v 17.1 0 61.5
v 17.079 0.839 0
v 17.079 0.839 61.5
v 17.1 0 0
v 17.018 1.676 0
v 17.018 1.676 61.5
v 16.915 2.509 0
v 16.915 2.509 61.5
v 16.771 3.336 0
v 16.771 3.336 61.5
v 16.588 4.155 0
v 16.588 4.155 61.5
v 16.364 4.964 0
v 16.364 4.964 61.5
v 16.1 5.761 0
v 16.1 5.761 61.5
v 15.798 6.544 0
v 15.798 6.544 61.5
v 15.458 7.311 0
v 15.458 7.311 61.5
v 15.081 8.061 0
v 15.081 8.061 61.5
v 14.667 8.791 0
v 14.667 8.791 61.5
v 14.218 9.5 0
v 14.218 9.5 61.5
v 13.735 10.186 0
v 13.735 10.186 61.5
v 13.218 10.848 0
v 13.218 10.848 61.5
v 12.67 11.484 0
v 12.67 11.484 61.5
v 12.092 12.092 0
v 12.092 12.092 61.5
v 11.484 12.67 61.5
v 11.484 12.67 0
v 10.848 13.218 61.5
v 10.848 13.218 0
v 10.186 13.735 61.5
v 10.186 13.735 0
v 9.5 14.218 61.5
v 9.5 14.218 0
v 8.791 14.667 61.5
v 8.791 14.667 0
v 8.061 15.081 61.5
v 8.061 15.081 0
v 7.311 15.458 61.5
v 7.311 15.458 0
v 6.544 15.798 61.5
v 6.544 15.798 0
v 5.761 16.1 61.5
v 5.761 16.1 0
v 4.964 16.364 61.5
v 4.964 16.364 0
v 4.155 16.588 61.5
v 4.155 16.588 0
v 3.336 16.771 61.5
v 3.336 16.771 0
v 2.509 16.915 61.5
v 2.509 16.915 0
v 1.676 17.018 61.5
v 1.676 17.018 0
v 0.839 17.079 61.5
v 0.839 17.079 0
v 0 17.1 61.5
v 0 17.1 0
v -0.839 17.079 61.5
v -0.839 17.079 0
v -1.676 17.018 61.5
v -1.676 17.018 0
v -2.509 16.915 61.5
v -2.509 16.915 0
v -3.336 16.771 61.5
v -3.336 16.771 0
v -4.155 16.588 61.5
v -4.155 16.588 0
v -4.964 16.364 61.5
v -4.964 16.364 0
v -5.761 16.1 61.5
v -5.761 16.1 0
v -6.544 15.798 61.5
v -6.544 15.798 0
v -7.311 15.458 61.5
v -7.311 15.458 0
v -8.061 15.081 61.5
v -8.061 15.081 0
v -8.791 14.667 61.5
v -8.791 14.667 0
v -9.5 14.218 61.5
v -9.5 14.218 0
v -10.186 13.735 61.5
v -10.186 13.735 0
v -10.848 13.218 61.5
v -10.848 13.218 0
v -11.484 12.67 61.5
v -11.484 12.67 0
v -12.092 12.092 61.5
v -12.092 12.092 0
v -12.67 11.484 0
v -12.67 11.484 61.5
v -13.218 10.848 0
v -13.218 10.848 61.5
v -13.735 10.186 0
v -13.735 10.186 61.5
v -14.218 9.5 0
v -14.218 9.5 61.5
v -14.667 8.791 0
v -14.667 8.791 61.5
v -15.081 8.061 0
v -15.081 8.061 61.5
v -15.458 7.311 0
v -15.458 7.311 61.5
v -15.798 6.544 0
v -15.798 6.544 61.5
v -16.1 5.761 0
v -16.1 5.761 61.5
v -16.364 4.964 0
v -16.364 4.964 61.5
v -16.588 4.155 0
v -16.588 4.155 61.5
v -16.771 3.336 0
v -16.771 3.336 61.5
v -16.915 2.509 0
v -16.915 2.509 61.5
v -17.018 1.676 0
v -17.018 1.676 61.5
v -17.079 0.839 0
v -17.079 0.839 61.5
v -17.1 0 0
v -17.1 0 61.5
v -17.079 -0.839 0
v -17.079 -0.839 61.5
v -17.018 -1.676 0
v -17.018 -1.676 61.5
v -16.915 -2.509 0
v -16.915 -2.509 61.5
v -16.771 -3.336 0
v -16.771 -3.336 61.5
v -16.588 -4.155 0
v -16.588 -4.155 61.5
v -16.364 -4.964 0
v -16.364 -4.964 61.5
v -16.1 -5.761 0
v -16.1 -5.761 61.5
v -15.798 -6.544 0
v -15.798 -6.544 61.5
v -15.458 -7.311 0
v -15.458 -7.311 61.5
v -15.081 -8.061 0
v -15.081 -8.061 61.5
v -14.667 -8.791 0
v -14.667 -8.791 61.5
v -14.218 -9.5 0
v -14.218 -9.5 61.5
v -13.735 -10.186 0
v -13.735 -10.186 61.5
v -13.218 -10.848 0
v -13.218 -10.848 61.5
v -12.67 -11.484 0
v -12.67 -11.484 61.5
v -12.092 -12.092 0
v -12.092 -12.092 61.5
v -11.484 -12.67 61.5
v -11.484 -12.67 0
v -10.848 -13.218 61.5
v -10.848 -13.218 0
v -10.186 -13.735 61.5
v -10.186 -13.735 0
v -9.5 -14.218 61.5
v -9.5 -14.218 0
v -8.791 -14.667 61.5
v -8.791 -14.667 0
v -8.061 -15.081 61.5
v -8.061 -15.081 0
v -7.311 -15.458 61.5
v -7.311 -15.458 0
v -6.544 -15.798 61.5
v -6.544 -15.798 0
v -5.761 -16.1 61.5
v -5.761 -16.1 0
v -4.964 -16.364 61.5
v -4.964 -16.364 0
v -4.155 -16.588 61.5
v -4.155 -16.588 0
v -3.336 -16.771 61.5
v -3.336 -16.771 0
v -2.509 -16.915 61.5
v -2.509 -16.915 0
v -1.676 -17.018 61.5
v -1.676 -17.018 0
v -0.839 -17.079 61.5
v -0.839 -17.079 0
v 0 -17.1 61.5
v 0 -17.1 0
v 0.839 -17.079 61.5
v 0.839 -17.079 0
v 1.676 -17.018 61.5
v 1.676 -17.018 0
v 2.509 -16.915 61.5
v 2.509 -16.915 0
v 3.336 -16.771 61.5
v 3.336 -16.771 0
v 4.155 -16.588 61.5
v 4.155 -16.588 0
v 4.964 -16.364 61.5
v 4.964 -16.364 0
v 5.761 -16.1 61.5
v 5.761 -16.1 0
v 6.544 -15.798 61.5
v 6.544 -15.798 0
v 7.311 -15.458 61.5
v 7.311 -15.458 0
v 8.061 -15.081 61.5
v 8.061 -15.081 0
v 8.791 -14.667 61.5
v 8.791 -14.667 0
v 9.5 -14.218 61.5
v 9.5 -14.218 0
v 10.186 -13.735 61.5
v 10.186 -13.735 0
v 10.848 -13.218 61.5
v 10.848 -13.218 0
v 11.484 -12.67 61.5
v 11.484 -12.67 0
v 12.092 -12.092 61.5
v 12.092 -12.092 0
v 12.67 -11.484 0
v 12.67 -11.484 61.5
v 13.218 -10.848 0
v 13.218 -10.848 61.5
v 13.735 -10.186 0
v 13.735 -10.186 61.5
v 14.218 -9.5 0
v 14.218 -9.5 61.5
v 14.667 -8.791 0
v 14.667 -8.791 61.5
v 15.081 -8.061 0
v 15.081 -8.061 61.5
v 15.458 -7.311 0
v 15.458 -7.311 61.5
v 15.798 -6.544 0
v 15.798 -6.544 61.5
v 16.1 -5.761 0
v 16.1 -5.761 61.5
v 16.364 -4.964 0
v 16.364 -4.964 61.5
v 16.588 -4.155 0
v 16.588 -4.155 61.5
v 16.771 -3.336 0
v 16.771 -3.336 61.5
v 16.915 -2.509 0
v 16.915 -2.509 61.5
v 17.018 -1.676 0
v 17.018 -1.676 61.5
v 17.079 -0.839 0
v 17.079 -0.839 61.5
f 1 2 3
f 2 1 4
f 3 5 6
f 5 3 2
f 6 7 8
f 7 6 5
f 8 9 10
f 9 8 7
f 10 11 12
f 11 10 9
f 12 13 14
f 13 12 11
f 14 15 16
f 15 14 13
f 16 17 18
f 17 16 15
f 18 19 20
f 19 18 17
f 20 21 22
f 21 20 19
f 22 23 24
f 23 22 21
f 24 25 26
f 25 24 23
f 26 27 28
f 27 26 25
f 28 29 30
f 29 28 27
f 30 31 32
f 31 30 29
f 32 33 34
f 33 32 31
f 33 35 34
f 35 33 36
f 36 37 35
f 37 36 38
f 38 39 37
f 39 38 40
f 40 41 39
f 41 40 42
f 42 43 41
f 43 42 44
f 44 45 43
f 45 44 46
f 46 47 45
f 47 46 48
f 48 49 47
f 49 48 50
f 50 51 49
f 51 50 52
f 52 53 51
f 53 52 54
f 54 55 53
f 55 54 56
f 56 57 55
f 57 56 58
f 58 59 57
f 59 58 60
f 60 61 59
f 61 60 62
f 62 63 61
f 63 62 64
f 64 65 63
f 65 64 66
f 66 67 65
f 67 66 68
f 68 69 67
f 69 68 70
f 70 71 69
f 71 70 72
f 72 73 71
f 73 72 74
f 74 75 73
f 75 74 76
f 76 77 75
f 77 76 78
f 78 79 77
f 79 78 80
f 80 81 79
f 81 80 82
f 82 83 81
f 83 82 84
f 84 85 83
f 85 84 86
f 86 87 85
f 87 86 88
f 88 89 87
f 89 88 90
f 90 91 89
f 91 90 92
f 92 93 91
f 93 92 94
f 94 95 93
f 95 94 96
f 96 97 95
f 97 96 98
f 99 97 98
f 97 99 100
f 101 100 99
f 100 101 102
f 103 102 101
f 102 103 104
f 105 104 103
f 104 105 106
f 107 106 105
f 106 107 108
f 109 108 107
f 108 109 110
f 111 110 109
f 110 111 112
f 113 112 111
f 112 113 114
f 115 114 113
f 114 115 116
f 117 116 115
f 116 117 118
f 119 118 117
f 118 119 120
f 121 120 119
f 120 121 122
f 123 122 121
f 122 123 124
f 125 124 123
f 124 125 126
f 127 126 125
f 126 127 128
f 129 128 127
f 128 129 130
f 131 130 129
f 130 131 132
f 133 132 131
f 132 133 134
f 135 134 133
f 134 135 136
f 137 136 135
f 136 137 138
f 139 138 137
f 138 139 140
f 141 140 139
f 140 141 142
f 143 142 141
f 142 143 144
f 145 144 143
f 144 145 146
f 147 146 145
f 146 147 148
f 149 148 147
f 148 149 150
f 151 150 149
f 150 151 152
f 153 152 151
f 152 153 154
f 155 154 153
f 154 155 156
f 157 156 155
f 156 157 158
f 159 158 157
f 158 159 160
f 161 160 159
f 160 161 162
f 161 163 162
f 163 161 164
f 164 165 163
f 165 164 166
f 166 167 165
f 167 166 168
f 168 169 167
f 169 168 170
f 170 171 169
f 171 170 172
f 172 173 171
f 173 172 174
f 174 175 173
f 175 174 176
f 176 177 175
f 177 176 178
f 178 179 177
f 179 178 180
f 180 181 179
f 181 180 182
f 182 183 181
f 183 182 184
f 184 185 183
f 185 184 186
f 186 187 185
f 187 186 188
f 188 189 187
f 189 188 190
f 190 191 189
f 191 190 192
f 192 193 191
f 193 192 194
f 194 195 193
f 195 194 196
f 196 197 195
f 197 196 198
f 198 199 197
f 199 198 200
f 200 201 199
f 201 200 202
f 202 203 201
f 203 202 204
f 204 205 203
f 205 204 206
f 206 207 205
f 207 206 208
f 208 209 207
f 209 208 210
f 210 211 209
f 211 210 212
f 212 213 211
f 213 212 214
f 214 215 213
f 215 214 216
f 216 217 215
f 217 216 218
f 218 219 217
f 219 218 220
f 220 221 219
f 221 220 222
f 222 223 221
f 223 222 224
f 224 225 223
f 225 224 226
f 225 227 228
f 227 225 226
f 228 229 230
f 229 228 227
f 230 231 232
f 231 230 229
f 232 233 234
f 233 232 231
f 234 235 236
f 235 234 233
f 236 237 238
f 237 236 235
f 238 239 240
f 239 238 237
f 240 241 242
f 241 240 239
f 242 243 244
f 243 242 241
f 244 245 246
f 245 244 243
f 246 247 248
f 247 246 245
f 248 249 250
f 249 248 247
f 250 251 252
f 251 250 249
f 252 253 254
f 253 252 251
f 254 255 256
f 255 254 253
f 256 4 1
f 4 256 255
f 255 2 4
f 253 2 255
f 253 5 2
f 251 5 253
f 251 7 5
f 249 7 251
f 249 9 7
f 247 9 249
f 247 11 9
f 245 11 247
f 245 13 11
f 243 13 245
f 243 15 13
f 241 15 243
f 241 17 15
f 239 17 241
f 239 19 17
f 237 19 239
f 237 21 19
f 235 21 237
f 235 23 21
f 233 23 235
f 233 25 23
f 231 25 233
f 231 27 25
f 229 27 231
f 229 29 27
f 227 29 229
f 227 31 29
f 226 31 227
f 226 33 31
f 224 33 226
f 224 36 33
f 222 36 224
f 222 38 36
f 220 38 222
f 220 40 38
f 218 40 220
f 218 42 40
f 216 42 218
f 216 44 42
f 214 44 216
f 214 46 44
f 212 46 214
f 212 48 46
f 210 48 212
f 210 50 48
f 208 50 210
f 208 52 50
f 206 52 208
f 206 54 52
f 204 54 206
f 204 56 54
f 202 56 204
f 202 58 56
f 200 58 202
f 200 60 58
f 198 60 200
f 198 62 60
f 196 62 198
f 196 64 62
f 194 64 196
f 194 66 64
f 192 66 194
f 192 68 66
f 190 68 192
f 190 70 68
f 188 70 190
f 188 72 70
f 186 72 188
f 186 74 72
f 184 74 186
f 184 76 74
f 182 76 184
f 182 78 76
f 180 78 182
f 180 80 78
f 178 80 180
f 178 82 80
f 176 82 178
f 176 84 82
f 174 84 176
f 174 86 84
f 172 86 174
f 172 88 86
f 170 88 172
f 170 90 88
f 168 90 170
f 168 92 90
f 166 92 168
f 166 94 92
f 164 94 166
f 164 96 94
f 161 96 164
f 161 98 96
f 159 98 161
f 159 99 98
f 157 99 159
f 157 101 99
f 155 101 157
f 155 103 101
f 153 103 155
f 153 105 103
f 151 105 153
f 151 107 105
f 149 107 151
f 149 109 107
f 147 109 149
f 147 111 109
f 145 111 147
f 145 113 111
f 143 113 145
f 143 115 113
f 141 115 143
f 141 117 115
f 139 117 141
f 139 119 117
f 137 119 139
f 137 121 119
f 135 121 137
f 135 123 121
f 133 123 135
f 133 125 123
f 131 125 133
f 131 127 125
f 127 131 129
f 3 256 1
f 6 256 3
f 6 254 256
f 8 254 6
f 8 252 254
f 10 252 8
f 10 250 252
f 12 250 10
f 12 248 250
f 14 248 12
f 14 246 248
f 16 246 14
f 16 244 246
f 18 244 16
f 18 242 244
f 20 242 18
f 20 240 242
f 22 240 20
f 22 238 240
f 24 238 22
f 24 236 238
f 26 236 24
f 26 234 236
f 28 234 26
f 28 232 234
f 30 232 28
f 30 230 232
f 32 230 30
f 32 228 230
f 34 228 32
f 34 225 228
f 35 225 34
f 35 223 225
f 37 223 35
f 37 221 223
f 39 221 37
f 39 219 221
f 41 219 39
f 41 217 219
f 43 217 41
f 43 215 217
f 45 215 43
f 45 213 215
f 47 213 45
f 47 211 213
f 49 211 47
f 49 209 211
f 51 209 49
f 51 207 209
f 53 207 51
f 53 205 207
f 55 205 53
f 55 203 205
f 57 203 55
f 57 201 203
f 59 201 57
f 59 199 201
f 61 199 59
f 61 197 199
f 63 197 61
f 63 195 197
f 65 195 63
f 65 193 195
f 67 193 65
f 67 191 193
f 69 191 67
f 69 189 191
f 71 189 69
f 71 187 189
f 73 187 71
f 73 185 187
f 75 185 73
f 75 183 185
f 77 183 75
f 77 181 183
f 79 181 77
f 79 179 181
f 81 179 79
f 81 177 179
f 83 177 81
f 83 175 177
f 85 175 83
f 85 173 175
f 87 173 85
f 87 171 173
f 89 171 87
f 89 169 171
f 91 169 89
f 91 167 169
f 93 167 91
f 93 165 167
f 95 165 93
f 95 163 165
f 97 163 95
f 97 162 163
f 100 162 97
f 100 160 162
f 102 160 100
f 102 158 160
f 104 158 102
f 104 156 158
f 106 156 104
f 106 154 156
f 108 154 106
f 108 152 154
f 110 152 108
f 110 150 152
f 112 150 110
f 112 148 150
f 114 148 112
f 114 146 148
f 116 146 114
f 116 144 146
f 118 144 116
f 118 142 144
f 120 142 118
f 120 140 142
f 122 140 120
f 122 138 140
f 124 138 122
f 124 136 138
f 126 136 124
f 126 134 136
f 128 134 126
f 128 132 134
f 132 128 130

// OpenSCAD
$fn = 128;

height = 61.5;      // mm
diameter = 34.2;    // mm

cylinder(h = height, d = diameter);
